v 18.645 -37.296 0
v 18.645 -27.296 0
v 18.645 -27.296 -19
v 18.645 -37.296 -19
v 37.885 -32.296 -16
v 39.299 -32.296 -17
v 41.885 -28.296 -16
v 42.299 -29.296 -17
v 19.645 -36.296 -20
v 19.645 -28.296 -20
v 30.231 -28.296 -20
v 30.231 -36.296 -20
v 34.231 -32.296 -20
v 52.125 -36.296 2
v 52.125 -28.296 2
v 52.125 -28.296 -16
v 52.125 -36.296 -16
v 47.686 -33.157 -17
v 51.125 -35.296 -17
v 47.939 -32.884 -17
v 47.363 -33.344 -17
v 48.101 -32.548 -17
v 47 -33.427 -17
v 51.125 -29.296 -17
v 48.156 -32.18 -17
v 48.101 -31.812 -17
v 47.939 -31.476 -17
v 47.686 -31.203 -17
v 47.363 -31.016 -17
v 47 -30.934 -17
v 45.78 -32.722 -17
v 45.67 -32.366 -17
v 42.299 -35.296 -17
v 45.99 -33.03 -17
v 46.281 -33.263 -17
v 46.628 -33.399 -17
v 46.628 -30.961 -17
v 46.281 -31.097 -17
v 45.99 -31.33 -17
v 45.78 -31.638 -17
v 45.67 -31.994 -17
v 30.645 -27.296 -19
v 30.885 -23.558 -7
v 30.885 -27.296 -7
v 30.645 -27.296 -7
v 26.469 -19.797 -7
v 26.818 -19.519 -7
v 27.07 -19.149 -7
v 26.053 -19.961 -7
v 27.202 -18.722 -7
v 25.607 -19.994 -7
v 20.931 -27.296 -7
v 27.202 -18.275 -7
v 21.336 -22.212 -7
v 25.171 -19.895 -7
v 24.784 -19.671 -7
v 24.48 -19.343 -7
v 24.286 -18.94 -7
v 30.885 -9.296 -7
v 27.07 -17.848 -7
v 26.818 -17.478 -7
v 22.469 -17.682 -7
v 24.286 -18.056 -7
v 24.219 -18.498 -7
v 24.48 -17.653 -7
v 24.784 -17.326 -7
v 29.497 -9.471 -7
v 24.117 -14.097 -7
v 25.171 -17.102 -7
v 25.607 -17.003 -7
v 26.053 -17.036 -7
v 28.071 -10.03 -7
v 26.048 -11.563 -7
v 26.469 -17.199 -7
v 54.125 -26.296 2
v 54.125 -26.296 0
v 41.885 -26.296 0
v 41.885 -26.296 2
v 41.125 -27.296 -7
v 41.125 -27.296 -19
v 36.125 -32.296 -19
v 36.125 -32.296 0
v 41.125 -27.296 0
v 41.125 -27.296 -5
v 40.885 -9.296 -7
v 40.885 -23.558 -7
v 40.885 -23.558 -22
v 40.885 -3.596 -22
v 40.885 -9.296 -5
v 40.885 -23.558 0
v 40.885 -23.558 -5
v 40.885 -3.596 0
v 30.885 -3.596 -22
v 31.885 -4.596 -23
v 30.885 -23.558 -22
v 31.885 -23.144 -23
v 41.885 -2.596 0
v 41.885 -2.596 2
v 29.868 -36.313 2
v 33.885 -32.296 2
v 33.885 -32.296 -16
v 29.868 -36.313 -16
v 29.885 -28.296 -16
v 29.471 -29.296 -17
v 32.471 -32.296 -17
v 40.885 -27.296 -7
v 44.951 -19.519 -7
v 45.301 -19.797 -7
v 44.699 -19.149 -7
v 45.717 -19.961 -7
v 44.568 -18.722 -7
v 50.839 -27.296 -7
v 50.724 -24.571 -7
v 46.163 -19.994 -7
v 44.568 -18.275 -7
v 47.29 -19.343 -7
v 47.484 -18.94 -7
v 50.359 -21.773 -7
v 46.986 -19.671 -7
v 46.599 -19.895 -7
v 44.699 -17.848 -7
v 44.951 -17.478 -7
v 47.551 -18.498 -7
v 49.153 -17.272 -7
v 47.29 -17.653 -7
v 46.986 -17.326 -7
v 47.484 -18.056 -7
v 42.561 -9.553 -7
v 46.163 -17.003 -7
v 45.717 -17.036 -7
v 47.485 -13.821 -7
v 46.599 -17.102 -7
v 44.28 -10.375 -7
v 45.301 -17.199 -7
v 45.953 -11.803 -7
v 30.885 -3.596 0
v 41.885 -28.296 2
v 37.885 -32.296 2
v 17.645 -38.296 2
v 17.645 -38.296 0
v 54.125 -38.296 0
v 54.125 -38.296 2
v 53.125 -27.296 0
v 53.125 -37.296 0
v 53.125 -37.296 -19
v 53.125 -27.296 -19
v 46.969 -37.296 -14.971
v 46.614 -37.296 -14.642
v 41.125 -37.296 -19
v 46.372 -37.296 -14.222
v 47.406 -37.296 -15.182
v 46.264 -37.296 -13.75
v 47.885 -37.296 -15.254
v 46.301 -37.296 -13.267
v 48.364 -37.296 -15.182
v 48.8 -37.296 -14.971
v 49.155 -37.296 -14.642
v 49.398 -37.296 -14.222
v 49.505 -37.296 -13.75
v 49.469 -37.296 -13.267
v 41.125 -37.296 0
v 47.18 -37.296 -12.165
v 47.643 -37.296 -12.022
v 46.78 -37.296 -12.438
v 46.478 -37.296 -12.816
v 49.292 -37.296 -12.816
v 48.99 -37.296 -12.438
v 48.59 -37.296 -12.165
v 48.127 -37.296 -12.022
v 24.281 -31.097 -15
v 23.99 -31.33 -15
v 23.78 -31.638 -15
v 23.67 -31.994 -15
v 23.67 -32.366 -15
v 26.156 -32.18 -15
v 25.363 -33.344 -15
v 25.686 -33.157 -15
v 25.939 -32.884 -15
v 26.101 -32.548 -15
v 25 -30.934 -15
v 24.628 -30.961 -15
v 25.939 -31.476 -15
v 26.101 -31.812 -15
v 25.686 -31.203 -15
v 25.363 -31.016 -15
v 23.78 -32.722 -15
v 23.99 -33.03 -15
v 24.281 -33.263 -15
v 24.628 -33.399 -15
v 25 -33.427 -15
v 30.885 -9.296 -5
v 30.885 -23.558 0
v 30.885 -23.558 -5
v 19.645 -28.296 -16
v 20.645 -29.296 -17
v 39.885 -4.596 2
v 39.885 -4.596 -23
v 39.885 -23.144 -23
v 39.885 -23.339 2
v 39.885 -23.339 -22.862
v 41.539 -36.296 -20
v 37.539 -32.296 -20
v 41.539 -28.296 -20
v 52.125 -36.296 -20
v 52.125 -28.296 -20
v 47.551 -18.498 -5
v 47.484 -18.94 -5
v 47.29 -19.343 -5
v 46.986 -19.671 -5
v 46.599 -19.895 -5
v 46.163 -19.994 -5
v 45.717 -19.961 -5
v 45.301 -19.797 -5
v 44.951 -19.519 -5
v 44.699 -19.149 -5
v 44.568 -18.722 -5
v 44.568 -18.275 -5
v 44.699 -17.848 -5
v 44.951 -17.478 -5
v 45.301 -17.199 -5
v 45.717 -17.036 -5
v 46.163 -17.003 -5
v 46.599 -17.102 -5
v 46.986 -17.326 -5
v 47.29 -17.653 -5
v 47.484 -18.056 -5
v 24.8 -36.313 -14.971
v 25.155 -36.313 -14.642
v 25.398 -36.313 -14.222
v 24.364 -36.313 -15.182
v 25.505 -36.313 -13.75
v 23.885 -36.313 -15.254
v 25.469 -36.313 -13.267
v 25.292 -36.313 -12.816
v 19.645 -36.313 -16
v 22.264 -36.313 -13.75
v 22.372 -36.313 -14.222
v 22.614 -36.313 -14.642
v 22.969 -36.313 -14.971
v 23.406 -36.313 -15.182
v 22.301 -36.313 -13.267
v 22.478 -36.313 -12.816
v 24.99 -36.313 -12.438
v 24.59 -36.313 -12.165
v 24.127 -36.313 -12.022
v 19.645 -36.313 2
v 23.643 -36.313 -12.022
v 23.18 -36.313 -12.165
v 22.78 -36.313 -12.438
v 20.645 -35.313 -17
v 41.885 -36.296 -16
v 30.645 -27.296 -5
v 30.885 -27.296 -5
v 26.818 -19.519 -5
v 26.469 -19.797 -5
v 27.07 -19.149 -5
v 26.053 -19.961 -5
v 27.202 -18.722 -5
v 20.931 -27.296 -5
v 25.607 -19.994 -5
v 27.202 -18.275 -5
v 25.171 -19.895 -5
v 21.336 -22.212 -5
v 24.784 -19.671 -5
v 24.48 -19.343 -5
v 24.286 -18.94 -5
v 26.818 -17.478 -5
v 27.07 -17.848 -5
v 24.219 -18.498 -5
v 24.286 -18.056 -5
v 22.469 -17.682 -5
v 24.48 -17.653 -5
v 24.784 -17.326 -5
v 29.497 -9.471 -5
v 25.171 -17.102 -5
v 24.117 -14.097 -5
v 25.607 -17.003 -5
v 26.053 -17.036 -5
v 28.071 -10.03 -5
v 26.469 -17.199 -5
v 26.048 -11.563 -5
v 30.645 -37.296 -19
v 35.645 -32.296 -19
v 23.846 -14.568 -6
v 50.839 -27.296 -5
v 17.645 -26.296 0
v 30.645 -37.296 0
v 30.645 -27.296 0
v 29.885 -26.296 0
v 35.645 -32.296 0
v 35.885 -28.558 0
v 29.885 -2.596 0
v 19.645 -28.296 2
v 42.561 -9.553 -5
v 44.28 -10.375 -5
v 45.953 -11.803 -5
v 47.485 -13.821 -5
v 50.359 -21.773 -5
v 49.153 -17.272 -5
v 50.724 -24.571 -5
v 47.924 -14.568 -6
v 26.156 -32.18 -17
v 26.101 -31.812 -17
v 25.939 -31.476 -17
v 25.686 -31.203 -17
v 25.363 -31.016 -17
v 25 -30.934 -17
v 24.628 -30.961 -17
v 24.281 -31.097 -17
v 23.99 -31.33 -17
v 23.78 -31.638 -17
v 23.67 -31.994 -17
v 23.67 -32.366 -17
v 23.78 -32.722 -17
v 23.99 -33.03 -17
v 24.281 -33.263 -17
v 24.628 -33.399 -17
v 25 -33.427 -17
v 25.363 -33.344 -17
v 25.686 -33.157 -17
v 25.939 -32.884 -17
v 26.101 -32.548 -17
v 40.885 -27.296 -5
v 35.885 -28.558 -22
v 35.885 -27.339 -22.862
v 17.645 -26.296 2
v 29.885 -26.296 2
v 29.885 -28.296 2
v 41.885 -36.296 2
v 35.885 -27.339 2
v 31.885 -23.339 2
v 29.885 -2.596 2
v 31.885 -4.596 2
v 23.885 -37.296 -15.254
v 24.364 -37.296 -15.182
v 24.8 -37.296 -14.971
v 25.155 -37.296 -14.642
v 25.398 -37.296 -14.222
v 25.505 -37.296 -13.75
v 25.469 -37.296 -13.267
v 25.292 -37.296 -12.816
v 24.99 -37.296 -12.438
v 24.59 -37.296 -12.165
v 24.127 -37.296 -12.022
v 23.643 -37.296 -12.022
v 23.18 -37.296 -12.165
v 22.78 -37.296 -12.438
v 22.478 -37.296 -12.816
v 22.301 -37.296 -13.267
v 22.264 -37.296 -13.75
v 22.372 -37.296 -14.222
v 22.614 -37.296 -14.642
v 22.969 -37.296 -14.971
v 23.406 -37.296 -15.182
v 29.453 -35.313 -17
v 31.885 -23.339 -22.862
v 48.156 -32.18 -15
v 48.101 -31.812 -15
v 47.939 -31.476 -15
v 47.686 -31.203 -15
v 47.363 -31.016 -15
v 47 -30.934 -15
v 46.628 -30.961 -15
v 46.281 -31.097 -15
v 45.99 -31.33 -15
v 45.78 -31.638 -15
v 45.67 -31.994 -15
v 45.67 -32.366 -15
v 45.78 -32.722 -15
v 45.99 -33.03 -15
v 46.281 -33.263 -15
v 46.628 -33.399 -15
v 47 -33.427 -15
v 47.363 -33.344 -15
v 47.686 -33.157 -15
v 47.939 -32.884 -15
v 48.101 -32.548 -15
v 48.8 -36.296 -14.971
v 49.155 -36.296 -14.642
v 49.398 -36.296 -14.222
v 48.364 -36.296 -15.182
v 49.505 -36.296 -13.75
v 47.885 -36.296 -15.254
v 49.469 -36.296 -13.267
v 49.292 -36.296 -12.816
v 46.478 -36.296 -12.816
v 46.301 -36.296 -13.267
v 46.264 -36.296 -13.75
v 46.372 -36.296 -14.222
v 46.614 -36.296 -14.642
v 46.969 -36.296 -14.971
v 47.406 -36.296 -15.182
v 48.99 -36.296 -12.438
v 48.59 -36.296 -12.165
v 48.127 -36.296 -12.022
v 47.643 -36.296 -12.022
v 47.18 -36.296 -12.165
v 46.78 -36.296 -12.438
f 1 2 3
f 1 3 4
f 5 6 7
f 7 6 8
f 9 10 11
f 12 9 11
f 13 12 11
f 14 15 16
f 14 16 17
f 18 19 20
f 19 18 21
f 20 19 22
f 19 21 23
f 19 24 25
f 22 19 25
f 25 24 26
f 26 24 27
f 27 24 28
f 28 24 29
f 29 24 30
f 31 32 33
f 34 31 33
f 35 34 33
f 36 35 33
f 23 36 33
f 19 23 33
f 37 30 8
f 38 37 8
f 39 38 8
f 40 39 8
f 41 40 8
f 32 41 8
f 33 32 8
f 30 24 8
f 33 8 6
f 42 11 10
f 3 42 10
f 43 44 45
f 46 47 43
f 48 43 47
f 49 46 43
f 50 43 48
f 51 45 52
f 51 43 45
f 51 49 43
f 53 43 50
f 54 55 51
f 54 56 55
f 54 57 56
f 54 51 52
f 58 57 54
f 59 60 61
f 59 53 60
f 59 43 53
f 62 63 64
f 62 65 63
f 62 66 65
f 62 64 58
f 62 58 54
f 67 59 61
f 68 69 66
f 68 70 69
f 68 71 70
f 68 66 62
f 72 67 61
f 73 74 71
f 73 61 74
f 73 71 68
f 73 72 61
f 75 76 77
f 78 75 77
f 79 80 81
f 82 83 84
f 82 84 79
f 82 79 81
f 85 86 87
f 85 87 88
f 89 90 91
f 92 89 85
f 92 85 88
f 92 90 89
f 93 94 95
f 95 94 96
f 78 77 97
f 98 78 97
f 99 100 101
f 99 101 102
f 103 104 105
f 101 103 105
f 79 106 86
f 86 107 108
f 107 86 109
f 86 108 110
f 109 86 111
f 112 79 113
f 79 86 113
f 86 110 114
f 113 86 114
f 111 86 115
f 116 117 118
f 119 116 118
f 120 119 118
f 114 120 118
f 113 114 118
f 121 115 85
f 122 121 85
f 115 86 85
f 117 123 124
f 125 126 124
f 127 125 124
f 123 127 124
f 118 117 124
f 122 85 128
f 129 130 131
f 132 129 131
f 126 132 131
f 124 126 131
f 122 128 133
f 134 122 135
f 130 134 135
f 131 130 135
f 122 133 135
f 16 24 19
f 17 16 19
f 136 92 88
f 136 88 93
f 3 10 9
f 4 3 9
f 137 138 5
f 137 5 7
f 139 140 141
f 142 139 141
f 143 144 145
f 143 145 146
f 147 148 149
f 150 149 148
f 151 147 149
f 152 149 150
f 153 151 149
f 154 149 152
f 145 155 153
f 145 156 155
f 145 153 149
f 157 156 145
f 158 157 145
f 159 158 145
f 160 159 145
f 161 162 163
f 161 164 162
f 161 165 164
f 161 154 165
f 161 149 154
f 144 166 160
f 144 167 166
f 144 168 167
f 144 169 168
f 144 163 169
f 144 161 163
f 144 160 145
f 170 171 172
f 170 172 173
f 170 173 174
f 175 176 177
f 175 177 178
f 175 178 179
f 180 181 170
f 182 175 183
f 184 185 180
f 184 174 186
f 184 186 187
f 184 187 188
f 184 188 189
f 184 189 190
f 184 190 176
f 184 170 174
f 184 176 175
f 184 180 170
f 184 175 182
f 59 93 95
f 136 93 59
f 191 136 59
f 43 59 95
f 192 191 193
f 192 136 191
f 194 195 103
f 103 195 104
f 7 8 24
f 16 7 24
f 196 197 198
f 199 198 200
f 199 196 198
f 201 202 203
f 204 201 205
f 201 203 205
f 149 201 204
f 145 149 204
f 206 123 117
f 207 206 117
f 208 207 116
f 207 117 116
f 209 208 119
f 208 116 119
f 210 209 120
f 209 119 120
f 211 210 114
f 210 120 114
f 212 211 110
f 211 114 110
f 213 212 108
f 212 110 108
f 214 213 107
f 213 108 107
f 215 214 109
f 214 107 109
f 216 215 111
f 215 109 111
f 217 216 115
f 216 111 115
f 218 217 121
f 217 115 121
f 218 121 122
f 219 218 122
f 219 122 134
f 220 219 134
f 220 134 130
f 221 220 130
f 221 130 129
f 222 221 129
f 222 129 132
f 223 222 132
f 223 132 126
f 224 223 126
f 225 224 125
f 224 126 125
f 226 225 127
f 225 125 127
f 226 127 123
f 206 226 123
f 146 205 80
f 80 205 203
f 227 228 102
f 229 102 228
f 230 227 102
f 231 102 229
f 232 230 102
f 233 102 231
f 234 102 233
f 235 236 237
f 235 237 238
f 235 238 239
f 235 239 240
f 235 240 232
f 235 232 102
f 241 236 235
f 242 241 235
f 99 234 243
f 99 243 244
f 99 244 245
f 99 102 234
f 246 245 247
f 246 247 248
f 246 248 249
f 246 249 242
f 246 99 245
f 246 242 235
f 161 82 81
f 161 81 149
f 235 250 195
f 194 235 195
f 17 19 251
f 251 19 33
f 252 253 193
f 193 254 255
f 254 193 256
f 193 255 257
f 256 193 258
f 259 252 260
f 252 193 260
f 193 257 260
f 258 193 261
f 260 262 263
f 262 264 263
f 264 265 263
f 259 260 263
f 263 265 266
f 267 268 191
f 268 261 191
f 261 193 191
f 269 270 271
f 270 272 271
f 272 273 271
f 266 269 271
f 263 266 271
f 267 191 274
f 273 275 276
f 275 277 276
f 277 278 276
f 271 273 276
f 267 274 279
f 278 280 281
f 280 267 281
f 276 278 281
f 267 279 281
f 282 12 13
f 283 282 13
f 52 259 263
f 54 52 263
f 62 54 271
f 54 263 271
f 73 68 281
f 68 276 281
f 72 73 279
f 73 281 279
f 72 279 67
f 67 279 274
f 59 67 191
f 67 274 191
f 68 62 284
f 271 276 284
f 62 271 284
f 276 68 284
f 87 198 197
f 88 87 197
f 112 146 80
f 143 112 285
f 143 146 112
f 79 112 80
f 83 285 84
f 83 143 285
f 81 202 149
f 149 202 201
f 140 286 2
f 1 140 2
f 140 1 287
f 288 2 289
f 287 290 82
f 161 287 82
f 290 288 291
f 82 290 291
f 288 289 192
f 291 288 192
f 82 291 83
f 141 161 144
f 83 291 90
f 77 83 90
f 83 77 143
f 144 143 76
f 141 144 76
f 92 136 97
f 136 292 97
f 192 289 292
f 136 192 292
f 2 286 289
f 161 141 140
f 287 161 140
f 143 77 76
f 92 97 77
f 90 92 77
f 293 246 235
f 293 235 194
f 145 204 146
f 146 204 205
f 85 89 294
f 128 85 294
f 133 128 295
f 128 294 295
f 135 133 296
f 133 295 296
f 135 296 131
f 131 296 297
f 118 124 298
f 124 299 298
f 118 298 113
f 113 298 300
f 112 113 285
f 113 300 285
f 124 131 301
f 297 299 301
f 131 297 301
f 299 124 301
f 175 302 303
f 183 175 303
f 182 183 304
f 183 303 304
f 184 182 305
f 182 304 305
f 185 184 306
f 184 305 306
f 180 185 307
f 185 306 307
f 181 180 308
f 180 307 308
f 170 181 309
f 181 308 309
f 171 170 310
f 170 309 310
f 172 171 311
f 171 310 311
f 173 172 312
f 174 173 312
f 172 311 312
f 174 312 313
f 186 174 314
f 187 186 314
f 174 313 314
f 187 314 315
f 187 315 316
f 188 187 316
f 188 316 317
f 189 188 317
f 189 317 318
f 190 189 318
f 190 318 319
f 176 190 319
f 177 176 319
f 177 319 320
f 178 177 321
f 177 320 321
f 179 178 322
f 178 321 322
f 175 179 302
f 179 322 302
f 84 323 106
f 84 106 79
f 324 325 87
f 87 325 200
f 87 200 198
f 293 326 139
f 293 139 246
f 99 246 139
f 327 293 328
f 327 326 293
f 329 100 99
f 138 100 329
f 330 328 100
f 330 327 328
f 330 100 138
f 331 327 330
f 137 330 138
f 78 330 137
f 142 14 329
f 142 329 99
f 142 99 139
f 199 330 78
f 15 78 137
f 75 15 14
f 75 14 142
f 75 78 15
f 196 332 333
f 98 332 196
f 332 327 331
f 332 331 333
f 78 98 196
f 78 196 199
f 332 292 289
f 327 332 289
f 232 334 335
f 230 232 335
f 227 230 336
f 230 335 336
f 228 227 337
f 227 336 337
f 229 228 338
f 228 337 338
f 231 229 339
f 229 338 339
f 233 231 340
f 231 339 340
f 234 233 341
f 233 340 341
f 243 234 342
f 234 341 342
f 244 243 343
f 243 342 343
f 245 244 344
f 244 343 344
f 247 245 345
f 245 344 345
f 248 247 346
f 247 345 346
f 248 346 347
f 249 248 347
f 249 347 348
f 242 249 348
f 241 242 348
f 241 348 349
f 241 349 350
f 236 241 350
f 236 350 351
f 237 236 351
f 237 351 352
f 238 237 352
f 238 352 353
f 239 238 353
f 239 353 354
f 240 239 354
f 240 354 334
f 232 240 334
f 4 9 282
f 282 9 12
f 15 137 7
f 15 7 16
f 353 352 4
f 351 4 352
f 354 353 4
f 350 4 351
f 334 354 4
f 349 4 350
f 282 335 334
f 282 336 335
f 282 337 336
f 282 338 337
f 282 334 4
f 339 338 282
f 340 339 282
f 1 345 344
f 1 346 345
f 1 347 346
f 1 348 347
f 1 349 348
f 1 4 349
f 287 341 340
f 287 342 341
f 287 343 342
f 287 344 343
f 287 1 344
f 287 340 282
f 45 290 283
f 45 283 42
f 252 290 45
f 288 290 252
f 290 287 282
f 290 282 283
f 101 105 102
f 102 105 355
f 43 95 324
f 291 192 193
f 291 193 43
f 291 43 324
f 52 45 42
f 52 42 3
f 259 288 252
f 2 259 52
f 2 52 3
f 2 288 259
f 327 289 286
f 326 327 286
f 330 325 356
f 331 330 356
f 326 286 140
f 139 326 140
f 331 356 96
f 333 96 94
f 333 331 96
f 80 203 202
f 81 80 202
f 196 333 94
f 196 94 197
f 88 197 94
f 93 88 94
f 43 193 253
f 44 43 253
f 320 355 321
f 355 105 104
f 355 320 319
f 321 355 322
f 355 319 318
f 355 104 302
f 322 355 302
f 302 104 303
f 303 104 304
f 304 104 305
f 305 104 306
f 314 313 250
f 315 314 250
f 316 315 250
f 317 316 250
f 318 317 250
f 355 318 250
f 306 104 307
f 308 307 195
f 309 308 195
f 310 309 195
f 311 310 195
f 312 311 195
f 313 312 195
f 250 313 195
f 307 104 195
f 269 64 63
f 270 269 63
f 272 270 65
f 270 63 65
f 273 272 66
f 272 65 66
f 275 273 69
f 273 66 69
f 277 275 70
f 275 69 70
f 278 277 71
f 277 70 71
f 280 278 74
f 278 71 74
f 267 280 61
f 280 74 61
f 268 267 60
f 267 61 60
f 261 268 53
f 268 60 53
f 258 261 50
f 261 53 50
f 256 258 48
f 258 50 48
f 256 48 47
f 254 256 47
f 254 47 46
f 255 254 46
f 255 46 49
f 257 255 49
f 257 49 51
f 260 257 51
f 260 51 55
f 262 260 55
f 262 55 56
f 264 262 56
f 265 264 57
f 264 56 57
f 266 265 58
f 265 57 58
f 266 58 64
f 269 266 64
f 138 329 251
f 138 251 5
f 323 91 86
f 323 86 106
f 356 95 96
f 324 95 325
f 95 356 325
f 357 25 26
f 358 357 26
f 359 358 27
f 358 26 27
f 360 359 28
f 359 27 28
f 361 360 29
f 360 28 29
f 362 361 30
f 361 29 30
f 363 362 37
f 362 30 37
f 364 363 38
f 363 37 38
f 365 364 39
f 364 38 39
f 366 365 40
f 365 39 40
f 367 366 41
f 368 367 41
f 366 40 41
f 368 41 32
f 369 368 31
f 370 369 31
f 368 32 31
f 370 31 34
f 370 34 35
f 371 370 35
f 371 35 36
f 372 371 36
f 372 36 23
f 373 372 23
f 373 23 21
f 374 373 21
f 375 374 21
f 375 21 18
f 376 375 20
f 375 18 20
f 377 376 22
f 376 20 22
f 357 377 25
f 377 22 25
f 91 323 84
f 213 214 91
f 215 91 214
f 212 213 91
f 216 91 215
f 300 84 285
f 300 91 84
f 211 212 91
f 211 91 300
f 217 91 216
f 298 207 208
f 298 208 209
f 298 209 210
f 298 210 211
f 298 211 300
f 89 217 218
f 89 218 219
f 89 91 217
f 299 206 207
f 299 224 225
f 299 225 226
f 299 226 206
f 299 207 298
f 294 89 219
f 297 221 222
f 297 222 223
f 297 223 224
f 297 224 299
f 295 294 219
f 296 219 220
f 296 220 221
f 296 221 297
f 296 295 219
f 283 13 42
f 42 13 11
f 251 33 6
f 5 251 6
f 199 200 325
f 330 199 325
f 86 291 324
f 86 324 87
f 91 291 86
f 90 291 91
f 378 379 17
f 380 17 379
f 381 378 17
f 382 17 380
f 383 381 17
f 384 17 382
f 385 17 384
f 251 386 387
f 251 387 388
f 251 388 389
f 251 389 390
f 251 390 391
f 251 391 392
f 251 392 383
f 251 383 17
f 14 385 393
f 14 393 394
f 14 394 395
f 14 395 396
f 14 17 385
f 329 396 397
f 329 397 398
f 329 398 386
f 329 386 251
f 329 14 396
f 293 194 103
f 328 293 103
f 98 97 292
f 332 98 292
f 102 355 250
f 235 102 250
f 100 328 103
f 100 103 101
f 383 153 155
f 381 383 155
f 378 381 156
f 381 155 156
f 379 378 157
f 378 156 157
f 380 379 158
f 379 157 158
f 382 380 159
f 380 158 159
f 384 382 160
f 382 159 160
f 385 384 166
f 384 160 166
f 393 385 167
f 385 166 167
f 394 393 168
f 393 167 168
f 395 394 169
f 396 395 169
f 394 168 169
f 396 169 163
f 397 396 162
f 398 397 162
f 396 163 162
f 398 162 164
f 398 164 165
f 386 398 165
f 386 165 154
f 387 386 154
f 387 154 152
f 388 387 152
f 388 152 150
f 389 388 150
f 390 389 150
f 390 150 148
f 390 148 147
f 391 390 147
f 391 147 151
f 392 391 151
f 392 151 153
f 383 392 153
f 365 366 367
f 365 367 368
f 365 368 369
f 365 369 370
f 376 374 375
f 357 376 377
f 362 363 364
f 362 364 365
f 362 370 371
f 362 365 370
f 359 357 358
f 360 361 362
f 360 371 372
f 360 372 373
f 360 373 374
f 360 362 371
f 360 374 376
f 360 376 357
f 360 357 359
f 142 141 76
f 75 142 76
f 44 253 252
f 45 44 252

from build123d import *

# Parameters (mm, degrees)
BOSS_EXTRUDE1_DEPTH = 2
BOSS_EXTRUDE2_DEPTH = 20
BOSS_EXTRUDE3_DEPTH = 23
CHAMFER1_SIZE       = 1
CUT_EXTRUDE1_DEPTH  = 28
CUT_EXTRUDE2_DEPTH  = 19
CHAMFER2_SIZE       = 1
BOSS_EXTRUDE4_START = 5
BOSS_EXTRUDE4_DEPTH = 2
SKETCH8_R           = 1.5
CUT_EXTRUDE3_DEPTH  = 2
SKETCH9_R           = 1.625
CUT_EXTRUDE4_DEPTH  = 5
SKETCH10_R          = 1.25
BOSS_EXTRUDE5_DEPTH = 2


with BuildPart() as part:
    # Sketch2 → Boss-Extrude1 (new body)
    with BuildSketch(Plane.XY):
        Polygon((29.88488863, -2.595574528), (29.88488863, -26.295574528), (17.64488863, -26.295574528), (17.64488863, -38.295574528), (54.12488863, -38.295574528), (54.12488863, -26.295574528), (41.88488863, -26.295574528), (41.88488863, -2.595574528), align=None)
    extrude(amount=BOSS_EXTRUDE1_DEPTH)

    # Sketch3 → Boss-Extrude2 (add)
    with BuildSketch(Plane(origin=(0, 0, 0), x_dir=(-1, 0, 0), z_dir=(0, 0, -1))):
        Polygon((-53.12488863, -37.295574528), (-53.12488863, -27.295574528), (-41.12488863, -27.295574528), (-36.12488863, -32.295574528), (-41.12488863, -37.295574528), align=None)
        Polygon((-35.64488863, -32.295574528), (-30.64488863, -27.295574528), (-18.64488863, -27.295574528), (-18.64488863, -37.295574528), (-30.64488863, -37.295574528), align=None)
    extrude(amount=BOSS_EXTRUDE2_DEPTH)

    # Sketch3<3> → Boss-Extrude3 (add)
    with BuildSketch(Plane(origin=(0, 0, 0), x_dir=(-1, 0, 0), z_dir=(0, 0, -1))):
        Polygon((-40.88488863, -3.595574528), (-30.88488863, -3.595574528), (-30.88488863, -23.557914395), (-35.88488863, -28.557914395), (-40.88488863, -23.557914395), align=None)
    extrude(amount=BOSS_EXTRUDE3_DEPTH)

    # Chamfer1
    chamfer1_edges = [part.edges().sort_by_distance(p)[0] for p in [
        (53.12488863, -32.295574528, -20),
        (47.12488863, -37.295574528, -20),
        (38.62488863, -34.795574528, -20),
        (38.62488863, -29.795574528, -20),
        (47.12488863, -27.295574528, -20),
        (33.14488863, -29.795574528, -20),
        (33.14488863, -34.795574528, -20),
        (24.64488863, -37.295574528, -20),
        (18.64488863, -32.295574528, -20),
        (24.64488863, -27.295574528, -20),
        (40.88488863, -13.576744462, -23),
        (38.38488863, -26.057914395, -23),
        (33.38488863, -26.057914395, -23),
        (30.88488863, -13.576744462, -23),
        (35.88488863, -3.595574528, -23),
    ]]
    chamfer(chamfer1_edges, length=CHAMFER1_SIZE)

    # Sketch4 → Cut-Extrude1 (cut)
    with BuildSketch(Plane.XY.offset(2)):
        Polygon((31.88488863, -23.338741615), (31.88488863, -4.595574528), (39.88488863, -4.595574528), (39.88488863, -23.338741615), (35.88488863, -27.338741615), align=None)
    extrude(amount=-CUT_EXTRUDE1_DEPTH, mode=Mode.SUBTRACT)

    # Sketch4<3> → Cut-Extrude2 (cut)
    with BuildSketch(Plane.XY.offset(2)):
        Polygon((19.64488863, -36.312819682), (19.64488863, -28.295574528), (29.88488863, -28.295574528), (33.88488863, -32.295574528), (29.867643476, -36.312819682), align=None)
        Polygon((37.88488863, -32.295574528), (41.88488863, -28.295574528), (52.12488863, -28.295574528), (52.12488863, -36.295574528), (41.88488863, -36.295574528), align=None)
    extrude(amount=-CUT_EXTRUDE2_DEPTH, mode=Mode.SUBTRACT)

    # Chamfer2
    chamfer2_edges = [part.edges().sort_by_distance(p)[0] for p in [
        (19.64488863, -32.304197105, -17),
        (24.76488863, -28.295574528, -17),
        (31.88488863, -30.295574528, -17),
        (31.876266053, -34.304197105, -17),
        (24.756266053, -36.312819682, -17),
        (39.88488863, -30.295574528, -17),
        (47.00488863, -28.295574528, -17),
        (52.12488863, -32.295574528, -17),
        (47.00488863, -36.295574528, -17),
        (39.88488863, -34.295574528, -17),
    ]]
    chamfer(chamfer2_edges, length=CHAMFER2_SIZE)

    # Sketch7 → Boss-Extrude4 (add)
    with BuildSketch(Plane(origin=(0, 0, 0), x_dir=(-1, 0, 0), z_dir=(0, 0, -1)).offset(BOSS_EXTRUDE4_START)):
        with BuildLine():
            Line((-30.88488863, -9.295574528), (-30.88488863, -27.295574528))
            Line((-30.88488863, -27.295574528), (-20.930717386, -27.295574528))
            add(Edge.make_bspline(
                [(-20.930717386, -27.295574528), (-20.930717386, -9.295574528), (-30.88488863, -9.295574528)],
                knots=[4.71238898, 4.71238898, 4.71238898, 6.283185307, 6.283185307, 6.283185307], degree=2, weights=[1, 0.707106781, 1]))
        make_face()
        with BuildLine():
            Line((-40.88488863, -27.295574528), (-50.839059874, -27.295574528))
            add(Edge.make_bspline(
                [(-40.88488863, -9.295574528), (-50.839059874, -9.295574528), (-50.839059874, -27.295574528)],
                knots=[0, 0, 0, 1.570796327, 1.570796327, 1.570796327], degree=2, weights=[1, 0.707106781, 1]))
            Line((-40.88488863, -9.295574528), (-40.88488863, -27.295574528))
        make_face()
    extrude(amount=BOSS_EXTRUDE4_DEPTH)

    # Sketch8 → Cut-Extrude3 (cut)
    with BuildSketch(Plane(origin=(0, 0, -7), x_dir=(-1, 0, 0), z_dir=(0, 0, -1))):
        with Locations((-25.71892105, -18.498352077)):
            Circle(SKETCH8_R)
        with Locations(Location((-46.05085621, -18.498352077, 0), (0, 0, 180))):
            Circle(SKETCH8_R)
    extrude(amount=-CUT_EXTRUDE3_DEPTH, mode=Mode.SUBTRACT)

    # Sketch9 → Cut-Extrude4 (cut)
    with BuildSketch(Plane.XZ.offset(37.295574528)):
        with Locations(Location((23.88488863, -13.628778028, 0), (0, 0, 270))):
            Circle(SKETCH9_R)
        with Locations(Location((47.88488863, -13.628778028, 0), (0, 0, 270))):
            Circle(SKETCH9_R)
    extrude(amount=-CUT_EXTRUDE4_DEPTH, mode=Mode.SUBTRACT)

    # Sketch10 → Boss-Extrude5 (add)
    with BuildSketch(Plane.XY.offset(-17)):
        with Locations((46.906421739, -32.180011543)):
            Circle(SKETCH10_R)
        with Locations((24.906421739, -32.180011543)):
            Circle(SKETCH10_R)
    extrude(amount=BOSS_EXTRUDE5_DEPTH)


solid = part.part
